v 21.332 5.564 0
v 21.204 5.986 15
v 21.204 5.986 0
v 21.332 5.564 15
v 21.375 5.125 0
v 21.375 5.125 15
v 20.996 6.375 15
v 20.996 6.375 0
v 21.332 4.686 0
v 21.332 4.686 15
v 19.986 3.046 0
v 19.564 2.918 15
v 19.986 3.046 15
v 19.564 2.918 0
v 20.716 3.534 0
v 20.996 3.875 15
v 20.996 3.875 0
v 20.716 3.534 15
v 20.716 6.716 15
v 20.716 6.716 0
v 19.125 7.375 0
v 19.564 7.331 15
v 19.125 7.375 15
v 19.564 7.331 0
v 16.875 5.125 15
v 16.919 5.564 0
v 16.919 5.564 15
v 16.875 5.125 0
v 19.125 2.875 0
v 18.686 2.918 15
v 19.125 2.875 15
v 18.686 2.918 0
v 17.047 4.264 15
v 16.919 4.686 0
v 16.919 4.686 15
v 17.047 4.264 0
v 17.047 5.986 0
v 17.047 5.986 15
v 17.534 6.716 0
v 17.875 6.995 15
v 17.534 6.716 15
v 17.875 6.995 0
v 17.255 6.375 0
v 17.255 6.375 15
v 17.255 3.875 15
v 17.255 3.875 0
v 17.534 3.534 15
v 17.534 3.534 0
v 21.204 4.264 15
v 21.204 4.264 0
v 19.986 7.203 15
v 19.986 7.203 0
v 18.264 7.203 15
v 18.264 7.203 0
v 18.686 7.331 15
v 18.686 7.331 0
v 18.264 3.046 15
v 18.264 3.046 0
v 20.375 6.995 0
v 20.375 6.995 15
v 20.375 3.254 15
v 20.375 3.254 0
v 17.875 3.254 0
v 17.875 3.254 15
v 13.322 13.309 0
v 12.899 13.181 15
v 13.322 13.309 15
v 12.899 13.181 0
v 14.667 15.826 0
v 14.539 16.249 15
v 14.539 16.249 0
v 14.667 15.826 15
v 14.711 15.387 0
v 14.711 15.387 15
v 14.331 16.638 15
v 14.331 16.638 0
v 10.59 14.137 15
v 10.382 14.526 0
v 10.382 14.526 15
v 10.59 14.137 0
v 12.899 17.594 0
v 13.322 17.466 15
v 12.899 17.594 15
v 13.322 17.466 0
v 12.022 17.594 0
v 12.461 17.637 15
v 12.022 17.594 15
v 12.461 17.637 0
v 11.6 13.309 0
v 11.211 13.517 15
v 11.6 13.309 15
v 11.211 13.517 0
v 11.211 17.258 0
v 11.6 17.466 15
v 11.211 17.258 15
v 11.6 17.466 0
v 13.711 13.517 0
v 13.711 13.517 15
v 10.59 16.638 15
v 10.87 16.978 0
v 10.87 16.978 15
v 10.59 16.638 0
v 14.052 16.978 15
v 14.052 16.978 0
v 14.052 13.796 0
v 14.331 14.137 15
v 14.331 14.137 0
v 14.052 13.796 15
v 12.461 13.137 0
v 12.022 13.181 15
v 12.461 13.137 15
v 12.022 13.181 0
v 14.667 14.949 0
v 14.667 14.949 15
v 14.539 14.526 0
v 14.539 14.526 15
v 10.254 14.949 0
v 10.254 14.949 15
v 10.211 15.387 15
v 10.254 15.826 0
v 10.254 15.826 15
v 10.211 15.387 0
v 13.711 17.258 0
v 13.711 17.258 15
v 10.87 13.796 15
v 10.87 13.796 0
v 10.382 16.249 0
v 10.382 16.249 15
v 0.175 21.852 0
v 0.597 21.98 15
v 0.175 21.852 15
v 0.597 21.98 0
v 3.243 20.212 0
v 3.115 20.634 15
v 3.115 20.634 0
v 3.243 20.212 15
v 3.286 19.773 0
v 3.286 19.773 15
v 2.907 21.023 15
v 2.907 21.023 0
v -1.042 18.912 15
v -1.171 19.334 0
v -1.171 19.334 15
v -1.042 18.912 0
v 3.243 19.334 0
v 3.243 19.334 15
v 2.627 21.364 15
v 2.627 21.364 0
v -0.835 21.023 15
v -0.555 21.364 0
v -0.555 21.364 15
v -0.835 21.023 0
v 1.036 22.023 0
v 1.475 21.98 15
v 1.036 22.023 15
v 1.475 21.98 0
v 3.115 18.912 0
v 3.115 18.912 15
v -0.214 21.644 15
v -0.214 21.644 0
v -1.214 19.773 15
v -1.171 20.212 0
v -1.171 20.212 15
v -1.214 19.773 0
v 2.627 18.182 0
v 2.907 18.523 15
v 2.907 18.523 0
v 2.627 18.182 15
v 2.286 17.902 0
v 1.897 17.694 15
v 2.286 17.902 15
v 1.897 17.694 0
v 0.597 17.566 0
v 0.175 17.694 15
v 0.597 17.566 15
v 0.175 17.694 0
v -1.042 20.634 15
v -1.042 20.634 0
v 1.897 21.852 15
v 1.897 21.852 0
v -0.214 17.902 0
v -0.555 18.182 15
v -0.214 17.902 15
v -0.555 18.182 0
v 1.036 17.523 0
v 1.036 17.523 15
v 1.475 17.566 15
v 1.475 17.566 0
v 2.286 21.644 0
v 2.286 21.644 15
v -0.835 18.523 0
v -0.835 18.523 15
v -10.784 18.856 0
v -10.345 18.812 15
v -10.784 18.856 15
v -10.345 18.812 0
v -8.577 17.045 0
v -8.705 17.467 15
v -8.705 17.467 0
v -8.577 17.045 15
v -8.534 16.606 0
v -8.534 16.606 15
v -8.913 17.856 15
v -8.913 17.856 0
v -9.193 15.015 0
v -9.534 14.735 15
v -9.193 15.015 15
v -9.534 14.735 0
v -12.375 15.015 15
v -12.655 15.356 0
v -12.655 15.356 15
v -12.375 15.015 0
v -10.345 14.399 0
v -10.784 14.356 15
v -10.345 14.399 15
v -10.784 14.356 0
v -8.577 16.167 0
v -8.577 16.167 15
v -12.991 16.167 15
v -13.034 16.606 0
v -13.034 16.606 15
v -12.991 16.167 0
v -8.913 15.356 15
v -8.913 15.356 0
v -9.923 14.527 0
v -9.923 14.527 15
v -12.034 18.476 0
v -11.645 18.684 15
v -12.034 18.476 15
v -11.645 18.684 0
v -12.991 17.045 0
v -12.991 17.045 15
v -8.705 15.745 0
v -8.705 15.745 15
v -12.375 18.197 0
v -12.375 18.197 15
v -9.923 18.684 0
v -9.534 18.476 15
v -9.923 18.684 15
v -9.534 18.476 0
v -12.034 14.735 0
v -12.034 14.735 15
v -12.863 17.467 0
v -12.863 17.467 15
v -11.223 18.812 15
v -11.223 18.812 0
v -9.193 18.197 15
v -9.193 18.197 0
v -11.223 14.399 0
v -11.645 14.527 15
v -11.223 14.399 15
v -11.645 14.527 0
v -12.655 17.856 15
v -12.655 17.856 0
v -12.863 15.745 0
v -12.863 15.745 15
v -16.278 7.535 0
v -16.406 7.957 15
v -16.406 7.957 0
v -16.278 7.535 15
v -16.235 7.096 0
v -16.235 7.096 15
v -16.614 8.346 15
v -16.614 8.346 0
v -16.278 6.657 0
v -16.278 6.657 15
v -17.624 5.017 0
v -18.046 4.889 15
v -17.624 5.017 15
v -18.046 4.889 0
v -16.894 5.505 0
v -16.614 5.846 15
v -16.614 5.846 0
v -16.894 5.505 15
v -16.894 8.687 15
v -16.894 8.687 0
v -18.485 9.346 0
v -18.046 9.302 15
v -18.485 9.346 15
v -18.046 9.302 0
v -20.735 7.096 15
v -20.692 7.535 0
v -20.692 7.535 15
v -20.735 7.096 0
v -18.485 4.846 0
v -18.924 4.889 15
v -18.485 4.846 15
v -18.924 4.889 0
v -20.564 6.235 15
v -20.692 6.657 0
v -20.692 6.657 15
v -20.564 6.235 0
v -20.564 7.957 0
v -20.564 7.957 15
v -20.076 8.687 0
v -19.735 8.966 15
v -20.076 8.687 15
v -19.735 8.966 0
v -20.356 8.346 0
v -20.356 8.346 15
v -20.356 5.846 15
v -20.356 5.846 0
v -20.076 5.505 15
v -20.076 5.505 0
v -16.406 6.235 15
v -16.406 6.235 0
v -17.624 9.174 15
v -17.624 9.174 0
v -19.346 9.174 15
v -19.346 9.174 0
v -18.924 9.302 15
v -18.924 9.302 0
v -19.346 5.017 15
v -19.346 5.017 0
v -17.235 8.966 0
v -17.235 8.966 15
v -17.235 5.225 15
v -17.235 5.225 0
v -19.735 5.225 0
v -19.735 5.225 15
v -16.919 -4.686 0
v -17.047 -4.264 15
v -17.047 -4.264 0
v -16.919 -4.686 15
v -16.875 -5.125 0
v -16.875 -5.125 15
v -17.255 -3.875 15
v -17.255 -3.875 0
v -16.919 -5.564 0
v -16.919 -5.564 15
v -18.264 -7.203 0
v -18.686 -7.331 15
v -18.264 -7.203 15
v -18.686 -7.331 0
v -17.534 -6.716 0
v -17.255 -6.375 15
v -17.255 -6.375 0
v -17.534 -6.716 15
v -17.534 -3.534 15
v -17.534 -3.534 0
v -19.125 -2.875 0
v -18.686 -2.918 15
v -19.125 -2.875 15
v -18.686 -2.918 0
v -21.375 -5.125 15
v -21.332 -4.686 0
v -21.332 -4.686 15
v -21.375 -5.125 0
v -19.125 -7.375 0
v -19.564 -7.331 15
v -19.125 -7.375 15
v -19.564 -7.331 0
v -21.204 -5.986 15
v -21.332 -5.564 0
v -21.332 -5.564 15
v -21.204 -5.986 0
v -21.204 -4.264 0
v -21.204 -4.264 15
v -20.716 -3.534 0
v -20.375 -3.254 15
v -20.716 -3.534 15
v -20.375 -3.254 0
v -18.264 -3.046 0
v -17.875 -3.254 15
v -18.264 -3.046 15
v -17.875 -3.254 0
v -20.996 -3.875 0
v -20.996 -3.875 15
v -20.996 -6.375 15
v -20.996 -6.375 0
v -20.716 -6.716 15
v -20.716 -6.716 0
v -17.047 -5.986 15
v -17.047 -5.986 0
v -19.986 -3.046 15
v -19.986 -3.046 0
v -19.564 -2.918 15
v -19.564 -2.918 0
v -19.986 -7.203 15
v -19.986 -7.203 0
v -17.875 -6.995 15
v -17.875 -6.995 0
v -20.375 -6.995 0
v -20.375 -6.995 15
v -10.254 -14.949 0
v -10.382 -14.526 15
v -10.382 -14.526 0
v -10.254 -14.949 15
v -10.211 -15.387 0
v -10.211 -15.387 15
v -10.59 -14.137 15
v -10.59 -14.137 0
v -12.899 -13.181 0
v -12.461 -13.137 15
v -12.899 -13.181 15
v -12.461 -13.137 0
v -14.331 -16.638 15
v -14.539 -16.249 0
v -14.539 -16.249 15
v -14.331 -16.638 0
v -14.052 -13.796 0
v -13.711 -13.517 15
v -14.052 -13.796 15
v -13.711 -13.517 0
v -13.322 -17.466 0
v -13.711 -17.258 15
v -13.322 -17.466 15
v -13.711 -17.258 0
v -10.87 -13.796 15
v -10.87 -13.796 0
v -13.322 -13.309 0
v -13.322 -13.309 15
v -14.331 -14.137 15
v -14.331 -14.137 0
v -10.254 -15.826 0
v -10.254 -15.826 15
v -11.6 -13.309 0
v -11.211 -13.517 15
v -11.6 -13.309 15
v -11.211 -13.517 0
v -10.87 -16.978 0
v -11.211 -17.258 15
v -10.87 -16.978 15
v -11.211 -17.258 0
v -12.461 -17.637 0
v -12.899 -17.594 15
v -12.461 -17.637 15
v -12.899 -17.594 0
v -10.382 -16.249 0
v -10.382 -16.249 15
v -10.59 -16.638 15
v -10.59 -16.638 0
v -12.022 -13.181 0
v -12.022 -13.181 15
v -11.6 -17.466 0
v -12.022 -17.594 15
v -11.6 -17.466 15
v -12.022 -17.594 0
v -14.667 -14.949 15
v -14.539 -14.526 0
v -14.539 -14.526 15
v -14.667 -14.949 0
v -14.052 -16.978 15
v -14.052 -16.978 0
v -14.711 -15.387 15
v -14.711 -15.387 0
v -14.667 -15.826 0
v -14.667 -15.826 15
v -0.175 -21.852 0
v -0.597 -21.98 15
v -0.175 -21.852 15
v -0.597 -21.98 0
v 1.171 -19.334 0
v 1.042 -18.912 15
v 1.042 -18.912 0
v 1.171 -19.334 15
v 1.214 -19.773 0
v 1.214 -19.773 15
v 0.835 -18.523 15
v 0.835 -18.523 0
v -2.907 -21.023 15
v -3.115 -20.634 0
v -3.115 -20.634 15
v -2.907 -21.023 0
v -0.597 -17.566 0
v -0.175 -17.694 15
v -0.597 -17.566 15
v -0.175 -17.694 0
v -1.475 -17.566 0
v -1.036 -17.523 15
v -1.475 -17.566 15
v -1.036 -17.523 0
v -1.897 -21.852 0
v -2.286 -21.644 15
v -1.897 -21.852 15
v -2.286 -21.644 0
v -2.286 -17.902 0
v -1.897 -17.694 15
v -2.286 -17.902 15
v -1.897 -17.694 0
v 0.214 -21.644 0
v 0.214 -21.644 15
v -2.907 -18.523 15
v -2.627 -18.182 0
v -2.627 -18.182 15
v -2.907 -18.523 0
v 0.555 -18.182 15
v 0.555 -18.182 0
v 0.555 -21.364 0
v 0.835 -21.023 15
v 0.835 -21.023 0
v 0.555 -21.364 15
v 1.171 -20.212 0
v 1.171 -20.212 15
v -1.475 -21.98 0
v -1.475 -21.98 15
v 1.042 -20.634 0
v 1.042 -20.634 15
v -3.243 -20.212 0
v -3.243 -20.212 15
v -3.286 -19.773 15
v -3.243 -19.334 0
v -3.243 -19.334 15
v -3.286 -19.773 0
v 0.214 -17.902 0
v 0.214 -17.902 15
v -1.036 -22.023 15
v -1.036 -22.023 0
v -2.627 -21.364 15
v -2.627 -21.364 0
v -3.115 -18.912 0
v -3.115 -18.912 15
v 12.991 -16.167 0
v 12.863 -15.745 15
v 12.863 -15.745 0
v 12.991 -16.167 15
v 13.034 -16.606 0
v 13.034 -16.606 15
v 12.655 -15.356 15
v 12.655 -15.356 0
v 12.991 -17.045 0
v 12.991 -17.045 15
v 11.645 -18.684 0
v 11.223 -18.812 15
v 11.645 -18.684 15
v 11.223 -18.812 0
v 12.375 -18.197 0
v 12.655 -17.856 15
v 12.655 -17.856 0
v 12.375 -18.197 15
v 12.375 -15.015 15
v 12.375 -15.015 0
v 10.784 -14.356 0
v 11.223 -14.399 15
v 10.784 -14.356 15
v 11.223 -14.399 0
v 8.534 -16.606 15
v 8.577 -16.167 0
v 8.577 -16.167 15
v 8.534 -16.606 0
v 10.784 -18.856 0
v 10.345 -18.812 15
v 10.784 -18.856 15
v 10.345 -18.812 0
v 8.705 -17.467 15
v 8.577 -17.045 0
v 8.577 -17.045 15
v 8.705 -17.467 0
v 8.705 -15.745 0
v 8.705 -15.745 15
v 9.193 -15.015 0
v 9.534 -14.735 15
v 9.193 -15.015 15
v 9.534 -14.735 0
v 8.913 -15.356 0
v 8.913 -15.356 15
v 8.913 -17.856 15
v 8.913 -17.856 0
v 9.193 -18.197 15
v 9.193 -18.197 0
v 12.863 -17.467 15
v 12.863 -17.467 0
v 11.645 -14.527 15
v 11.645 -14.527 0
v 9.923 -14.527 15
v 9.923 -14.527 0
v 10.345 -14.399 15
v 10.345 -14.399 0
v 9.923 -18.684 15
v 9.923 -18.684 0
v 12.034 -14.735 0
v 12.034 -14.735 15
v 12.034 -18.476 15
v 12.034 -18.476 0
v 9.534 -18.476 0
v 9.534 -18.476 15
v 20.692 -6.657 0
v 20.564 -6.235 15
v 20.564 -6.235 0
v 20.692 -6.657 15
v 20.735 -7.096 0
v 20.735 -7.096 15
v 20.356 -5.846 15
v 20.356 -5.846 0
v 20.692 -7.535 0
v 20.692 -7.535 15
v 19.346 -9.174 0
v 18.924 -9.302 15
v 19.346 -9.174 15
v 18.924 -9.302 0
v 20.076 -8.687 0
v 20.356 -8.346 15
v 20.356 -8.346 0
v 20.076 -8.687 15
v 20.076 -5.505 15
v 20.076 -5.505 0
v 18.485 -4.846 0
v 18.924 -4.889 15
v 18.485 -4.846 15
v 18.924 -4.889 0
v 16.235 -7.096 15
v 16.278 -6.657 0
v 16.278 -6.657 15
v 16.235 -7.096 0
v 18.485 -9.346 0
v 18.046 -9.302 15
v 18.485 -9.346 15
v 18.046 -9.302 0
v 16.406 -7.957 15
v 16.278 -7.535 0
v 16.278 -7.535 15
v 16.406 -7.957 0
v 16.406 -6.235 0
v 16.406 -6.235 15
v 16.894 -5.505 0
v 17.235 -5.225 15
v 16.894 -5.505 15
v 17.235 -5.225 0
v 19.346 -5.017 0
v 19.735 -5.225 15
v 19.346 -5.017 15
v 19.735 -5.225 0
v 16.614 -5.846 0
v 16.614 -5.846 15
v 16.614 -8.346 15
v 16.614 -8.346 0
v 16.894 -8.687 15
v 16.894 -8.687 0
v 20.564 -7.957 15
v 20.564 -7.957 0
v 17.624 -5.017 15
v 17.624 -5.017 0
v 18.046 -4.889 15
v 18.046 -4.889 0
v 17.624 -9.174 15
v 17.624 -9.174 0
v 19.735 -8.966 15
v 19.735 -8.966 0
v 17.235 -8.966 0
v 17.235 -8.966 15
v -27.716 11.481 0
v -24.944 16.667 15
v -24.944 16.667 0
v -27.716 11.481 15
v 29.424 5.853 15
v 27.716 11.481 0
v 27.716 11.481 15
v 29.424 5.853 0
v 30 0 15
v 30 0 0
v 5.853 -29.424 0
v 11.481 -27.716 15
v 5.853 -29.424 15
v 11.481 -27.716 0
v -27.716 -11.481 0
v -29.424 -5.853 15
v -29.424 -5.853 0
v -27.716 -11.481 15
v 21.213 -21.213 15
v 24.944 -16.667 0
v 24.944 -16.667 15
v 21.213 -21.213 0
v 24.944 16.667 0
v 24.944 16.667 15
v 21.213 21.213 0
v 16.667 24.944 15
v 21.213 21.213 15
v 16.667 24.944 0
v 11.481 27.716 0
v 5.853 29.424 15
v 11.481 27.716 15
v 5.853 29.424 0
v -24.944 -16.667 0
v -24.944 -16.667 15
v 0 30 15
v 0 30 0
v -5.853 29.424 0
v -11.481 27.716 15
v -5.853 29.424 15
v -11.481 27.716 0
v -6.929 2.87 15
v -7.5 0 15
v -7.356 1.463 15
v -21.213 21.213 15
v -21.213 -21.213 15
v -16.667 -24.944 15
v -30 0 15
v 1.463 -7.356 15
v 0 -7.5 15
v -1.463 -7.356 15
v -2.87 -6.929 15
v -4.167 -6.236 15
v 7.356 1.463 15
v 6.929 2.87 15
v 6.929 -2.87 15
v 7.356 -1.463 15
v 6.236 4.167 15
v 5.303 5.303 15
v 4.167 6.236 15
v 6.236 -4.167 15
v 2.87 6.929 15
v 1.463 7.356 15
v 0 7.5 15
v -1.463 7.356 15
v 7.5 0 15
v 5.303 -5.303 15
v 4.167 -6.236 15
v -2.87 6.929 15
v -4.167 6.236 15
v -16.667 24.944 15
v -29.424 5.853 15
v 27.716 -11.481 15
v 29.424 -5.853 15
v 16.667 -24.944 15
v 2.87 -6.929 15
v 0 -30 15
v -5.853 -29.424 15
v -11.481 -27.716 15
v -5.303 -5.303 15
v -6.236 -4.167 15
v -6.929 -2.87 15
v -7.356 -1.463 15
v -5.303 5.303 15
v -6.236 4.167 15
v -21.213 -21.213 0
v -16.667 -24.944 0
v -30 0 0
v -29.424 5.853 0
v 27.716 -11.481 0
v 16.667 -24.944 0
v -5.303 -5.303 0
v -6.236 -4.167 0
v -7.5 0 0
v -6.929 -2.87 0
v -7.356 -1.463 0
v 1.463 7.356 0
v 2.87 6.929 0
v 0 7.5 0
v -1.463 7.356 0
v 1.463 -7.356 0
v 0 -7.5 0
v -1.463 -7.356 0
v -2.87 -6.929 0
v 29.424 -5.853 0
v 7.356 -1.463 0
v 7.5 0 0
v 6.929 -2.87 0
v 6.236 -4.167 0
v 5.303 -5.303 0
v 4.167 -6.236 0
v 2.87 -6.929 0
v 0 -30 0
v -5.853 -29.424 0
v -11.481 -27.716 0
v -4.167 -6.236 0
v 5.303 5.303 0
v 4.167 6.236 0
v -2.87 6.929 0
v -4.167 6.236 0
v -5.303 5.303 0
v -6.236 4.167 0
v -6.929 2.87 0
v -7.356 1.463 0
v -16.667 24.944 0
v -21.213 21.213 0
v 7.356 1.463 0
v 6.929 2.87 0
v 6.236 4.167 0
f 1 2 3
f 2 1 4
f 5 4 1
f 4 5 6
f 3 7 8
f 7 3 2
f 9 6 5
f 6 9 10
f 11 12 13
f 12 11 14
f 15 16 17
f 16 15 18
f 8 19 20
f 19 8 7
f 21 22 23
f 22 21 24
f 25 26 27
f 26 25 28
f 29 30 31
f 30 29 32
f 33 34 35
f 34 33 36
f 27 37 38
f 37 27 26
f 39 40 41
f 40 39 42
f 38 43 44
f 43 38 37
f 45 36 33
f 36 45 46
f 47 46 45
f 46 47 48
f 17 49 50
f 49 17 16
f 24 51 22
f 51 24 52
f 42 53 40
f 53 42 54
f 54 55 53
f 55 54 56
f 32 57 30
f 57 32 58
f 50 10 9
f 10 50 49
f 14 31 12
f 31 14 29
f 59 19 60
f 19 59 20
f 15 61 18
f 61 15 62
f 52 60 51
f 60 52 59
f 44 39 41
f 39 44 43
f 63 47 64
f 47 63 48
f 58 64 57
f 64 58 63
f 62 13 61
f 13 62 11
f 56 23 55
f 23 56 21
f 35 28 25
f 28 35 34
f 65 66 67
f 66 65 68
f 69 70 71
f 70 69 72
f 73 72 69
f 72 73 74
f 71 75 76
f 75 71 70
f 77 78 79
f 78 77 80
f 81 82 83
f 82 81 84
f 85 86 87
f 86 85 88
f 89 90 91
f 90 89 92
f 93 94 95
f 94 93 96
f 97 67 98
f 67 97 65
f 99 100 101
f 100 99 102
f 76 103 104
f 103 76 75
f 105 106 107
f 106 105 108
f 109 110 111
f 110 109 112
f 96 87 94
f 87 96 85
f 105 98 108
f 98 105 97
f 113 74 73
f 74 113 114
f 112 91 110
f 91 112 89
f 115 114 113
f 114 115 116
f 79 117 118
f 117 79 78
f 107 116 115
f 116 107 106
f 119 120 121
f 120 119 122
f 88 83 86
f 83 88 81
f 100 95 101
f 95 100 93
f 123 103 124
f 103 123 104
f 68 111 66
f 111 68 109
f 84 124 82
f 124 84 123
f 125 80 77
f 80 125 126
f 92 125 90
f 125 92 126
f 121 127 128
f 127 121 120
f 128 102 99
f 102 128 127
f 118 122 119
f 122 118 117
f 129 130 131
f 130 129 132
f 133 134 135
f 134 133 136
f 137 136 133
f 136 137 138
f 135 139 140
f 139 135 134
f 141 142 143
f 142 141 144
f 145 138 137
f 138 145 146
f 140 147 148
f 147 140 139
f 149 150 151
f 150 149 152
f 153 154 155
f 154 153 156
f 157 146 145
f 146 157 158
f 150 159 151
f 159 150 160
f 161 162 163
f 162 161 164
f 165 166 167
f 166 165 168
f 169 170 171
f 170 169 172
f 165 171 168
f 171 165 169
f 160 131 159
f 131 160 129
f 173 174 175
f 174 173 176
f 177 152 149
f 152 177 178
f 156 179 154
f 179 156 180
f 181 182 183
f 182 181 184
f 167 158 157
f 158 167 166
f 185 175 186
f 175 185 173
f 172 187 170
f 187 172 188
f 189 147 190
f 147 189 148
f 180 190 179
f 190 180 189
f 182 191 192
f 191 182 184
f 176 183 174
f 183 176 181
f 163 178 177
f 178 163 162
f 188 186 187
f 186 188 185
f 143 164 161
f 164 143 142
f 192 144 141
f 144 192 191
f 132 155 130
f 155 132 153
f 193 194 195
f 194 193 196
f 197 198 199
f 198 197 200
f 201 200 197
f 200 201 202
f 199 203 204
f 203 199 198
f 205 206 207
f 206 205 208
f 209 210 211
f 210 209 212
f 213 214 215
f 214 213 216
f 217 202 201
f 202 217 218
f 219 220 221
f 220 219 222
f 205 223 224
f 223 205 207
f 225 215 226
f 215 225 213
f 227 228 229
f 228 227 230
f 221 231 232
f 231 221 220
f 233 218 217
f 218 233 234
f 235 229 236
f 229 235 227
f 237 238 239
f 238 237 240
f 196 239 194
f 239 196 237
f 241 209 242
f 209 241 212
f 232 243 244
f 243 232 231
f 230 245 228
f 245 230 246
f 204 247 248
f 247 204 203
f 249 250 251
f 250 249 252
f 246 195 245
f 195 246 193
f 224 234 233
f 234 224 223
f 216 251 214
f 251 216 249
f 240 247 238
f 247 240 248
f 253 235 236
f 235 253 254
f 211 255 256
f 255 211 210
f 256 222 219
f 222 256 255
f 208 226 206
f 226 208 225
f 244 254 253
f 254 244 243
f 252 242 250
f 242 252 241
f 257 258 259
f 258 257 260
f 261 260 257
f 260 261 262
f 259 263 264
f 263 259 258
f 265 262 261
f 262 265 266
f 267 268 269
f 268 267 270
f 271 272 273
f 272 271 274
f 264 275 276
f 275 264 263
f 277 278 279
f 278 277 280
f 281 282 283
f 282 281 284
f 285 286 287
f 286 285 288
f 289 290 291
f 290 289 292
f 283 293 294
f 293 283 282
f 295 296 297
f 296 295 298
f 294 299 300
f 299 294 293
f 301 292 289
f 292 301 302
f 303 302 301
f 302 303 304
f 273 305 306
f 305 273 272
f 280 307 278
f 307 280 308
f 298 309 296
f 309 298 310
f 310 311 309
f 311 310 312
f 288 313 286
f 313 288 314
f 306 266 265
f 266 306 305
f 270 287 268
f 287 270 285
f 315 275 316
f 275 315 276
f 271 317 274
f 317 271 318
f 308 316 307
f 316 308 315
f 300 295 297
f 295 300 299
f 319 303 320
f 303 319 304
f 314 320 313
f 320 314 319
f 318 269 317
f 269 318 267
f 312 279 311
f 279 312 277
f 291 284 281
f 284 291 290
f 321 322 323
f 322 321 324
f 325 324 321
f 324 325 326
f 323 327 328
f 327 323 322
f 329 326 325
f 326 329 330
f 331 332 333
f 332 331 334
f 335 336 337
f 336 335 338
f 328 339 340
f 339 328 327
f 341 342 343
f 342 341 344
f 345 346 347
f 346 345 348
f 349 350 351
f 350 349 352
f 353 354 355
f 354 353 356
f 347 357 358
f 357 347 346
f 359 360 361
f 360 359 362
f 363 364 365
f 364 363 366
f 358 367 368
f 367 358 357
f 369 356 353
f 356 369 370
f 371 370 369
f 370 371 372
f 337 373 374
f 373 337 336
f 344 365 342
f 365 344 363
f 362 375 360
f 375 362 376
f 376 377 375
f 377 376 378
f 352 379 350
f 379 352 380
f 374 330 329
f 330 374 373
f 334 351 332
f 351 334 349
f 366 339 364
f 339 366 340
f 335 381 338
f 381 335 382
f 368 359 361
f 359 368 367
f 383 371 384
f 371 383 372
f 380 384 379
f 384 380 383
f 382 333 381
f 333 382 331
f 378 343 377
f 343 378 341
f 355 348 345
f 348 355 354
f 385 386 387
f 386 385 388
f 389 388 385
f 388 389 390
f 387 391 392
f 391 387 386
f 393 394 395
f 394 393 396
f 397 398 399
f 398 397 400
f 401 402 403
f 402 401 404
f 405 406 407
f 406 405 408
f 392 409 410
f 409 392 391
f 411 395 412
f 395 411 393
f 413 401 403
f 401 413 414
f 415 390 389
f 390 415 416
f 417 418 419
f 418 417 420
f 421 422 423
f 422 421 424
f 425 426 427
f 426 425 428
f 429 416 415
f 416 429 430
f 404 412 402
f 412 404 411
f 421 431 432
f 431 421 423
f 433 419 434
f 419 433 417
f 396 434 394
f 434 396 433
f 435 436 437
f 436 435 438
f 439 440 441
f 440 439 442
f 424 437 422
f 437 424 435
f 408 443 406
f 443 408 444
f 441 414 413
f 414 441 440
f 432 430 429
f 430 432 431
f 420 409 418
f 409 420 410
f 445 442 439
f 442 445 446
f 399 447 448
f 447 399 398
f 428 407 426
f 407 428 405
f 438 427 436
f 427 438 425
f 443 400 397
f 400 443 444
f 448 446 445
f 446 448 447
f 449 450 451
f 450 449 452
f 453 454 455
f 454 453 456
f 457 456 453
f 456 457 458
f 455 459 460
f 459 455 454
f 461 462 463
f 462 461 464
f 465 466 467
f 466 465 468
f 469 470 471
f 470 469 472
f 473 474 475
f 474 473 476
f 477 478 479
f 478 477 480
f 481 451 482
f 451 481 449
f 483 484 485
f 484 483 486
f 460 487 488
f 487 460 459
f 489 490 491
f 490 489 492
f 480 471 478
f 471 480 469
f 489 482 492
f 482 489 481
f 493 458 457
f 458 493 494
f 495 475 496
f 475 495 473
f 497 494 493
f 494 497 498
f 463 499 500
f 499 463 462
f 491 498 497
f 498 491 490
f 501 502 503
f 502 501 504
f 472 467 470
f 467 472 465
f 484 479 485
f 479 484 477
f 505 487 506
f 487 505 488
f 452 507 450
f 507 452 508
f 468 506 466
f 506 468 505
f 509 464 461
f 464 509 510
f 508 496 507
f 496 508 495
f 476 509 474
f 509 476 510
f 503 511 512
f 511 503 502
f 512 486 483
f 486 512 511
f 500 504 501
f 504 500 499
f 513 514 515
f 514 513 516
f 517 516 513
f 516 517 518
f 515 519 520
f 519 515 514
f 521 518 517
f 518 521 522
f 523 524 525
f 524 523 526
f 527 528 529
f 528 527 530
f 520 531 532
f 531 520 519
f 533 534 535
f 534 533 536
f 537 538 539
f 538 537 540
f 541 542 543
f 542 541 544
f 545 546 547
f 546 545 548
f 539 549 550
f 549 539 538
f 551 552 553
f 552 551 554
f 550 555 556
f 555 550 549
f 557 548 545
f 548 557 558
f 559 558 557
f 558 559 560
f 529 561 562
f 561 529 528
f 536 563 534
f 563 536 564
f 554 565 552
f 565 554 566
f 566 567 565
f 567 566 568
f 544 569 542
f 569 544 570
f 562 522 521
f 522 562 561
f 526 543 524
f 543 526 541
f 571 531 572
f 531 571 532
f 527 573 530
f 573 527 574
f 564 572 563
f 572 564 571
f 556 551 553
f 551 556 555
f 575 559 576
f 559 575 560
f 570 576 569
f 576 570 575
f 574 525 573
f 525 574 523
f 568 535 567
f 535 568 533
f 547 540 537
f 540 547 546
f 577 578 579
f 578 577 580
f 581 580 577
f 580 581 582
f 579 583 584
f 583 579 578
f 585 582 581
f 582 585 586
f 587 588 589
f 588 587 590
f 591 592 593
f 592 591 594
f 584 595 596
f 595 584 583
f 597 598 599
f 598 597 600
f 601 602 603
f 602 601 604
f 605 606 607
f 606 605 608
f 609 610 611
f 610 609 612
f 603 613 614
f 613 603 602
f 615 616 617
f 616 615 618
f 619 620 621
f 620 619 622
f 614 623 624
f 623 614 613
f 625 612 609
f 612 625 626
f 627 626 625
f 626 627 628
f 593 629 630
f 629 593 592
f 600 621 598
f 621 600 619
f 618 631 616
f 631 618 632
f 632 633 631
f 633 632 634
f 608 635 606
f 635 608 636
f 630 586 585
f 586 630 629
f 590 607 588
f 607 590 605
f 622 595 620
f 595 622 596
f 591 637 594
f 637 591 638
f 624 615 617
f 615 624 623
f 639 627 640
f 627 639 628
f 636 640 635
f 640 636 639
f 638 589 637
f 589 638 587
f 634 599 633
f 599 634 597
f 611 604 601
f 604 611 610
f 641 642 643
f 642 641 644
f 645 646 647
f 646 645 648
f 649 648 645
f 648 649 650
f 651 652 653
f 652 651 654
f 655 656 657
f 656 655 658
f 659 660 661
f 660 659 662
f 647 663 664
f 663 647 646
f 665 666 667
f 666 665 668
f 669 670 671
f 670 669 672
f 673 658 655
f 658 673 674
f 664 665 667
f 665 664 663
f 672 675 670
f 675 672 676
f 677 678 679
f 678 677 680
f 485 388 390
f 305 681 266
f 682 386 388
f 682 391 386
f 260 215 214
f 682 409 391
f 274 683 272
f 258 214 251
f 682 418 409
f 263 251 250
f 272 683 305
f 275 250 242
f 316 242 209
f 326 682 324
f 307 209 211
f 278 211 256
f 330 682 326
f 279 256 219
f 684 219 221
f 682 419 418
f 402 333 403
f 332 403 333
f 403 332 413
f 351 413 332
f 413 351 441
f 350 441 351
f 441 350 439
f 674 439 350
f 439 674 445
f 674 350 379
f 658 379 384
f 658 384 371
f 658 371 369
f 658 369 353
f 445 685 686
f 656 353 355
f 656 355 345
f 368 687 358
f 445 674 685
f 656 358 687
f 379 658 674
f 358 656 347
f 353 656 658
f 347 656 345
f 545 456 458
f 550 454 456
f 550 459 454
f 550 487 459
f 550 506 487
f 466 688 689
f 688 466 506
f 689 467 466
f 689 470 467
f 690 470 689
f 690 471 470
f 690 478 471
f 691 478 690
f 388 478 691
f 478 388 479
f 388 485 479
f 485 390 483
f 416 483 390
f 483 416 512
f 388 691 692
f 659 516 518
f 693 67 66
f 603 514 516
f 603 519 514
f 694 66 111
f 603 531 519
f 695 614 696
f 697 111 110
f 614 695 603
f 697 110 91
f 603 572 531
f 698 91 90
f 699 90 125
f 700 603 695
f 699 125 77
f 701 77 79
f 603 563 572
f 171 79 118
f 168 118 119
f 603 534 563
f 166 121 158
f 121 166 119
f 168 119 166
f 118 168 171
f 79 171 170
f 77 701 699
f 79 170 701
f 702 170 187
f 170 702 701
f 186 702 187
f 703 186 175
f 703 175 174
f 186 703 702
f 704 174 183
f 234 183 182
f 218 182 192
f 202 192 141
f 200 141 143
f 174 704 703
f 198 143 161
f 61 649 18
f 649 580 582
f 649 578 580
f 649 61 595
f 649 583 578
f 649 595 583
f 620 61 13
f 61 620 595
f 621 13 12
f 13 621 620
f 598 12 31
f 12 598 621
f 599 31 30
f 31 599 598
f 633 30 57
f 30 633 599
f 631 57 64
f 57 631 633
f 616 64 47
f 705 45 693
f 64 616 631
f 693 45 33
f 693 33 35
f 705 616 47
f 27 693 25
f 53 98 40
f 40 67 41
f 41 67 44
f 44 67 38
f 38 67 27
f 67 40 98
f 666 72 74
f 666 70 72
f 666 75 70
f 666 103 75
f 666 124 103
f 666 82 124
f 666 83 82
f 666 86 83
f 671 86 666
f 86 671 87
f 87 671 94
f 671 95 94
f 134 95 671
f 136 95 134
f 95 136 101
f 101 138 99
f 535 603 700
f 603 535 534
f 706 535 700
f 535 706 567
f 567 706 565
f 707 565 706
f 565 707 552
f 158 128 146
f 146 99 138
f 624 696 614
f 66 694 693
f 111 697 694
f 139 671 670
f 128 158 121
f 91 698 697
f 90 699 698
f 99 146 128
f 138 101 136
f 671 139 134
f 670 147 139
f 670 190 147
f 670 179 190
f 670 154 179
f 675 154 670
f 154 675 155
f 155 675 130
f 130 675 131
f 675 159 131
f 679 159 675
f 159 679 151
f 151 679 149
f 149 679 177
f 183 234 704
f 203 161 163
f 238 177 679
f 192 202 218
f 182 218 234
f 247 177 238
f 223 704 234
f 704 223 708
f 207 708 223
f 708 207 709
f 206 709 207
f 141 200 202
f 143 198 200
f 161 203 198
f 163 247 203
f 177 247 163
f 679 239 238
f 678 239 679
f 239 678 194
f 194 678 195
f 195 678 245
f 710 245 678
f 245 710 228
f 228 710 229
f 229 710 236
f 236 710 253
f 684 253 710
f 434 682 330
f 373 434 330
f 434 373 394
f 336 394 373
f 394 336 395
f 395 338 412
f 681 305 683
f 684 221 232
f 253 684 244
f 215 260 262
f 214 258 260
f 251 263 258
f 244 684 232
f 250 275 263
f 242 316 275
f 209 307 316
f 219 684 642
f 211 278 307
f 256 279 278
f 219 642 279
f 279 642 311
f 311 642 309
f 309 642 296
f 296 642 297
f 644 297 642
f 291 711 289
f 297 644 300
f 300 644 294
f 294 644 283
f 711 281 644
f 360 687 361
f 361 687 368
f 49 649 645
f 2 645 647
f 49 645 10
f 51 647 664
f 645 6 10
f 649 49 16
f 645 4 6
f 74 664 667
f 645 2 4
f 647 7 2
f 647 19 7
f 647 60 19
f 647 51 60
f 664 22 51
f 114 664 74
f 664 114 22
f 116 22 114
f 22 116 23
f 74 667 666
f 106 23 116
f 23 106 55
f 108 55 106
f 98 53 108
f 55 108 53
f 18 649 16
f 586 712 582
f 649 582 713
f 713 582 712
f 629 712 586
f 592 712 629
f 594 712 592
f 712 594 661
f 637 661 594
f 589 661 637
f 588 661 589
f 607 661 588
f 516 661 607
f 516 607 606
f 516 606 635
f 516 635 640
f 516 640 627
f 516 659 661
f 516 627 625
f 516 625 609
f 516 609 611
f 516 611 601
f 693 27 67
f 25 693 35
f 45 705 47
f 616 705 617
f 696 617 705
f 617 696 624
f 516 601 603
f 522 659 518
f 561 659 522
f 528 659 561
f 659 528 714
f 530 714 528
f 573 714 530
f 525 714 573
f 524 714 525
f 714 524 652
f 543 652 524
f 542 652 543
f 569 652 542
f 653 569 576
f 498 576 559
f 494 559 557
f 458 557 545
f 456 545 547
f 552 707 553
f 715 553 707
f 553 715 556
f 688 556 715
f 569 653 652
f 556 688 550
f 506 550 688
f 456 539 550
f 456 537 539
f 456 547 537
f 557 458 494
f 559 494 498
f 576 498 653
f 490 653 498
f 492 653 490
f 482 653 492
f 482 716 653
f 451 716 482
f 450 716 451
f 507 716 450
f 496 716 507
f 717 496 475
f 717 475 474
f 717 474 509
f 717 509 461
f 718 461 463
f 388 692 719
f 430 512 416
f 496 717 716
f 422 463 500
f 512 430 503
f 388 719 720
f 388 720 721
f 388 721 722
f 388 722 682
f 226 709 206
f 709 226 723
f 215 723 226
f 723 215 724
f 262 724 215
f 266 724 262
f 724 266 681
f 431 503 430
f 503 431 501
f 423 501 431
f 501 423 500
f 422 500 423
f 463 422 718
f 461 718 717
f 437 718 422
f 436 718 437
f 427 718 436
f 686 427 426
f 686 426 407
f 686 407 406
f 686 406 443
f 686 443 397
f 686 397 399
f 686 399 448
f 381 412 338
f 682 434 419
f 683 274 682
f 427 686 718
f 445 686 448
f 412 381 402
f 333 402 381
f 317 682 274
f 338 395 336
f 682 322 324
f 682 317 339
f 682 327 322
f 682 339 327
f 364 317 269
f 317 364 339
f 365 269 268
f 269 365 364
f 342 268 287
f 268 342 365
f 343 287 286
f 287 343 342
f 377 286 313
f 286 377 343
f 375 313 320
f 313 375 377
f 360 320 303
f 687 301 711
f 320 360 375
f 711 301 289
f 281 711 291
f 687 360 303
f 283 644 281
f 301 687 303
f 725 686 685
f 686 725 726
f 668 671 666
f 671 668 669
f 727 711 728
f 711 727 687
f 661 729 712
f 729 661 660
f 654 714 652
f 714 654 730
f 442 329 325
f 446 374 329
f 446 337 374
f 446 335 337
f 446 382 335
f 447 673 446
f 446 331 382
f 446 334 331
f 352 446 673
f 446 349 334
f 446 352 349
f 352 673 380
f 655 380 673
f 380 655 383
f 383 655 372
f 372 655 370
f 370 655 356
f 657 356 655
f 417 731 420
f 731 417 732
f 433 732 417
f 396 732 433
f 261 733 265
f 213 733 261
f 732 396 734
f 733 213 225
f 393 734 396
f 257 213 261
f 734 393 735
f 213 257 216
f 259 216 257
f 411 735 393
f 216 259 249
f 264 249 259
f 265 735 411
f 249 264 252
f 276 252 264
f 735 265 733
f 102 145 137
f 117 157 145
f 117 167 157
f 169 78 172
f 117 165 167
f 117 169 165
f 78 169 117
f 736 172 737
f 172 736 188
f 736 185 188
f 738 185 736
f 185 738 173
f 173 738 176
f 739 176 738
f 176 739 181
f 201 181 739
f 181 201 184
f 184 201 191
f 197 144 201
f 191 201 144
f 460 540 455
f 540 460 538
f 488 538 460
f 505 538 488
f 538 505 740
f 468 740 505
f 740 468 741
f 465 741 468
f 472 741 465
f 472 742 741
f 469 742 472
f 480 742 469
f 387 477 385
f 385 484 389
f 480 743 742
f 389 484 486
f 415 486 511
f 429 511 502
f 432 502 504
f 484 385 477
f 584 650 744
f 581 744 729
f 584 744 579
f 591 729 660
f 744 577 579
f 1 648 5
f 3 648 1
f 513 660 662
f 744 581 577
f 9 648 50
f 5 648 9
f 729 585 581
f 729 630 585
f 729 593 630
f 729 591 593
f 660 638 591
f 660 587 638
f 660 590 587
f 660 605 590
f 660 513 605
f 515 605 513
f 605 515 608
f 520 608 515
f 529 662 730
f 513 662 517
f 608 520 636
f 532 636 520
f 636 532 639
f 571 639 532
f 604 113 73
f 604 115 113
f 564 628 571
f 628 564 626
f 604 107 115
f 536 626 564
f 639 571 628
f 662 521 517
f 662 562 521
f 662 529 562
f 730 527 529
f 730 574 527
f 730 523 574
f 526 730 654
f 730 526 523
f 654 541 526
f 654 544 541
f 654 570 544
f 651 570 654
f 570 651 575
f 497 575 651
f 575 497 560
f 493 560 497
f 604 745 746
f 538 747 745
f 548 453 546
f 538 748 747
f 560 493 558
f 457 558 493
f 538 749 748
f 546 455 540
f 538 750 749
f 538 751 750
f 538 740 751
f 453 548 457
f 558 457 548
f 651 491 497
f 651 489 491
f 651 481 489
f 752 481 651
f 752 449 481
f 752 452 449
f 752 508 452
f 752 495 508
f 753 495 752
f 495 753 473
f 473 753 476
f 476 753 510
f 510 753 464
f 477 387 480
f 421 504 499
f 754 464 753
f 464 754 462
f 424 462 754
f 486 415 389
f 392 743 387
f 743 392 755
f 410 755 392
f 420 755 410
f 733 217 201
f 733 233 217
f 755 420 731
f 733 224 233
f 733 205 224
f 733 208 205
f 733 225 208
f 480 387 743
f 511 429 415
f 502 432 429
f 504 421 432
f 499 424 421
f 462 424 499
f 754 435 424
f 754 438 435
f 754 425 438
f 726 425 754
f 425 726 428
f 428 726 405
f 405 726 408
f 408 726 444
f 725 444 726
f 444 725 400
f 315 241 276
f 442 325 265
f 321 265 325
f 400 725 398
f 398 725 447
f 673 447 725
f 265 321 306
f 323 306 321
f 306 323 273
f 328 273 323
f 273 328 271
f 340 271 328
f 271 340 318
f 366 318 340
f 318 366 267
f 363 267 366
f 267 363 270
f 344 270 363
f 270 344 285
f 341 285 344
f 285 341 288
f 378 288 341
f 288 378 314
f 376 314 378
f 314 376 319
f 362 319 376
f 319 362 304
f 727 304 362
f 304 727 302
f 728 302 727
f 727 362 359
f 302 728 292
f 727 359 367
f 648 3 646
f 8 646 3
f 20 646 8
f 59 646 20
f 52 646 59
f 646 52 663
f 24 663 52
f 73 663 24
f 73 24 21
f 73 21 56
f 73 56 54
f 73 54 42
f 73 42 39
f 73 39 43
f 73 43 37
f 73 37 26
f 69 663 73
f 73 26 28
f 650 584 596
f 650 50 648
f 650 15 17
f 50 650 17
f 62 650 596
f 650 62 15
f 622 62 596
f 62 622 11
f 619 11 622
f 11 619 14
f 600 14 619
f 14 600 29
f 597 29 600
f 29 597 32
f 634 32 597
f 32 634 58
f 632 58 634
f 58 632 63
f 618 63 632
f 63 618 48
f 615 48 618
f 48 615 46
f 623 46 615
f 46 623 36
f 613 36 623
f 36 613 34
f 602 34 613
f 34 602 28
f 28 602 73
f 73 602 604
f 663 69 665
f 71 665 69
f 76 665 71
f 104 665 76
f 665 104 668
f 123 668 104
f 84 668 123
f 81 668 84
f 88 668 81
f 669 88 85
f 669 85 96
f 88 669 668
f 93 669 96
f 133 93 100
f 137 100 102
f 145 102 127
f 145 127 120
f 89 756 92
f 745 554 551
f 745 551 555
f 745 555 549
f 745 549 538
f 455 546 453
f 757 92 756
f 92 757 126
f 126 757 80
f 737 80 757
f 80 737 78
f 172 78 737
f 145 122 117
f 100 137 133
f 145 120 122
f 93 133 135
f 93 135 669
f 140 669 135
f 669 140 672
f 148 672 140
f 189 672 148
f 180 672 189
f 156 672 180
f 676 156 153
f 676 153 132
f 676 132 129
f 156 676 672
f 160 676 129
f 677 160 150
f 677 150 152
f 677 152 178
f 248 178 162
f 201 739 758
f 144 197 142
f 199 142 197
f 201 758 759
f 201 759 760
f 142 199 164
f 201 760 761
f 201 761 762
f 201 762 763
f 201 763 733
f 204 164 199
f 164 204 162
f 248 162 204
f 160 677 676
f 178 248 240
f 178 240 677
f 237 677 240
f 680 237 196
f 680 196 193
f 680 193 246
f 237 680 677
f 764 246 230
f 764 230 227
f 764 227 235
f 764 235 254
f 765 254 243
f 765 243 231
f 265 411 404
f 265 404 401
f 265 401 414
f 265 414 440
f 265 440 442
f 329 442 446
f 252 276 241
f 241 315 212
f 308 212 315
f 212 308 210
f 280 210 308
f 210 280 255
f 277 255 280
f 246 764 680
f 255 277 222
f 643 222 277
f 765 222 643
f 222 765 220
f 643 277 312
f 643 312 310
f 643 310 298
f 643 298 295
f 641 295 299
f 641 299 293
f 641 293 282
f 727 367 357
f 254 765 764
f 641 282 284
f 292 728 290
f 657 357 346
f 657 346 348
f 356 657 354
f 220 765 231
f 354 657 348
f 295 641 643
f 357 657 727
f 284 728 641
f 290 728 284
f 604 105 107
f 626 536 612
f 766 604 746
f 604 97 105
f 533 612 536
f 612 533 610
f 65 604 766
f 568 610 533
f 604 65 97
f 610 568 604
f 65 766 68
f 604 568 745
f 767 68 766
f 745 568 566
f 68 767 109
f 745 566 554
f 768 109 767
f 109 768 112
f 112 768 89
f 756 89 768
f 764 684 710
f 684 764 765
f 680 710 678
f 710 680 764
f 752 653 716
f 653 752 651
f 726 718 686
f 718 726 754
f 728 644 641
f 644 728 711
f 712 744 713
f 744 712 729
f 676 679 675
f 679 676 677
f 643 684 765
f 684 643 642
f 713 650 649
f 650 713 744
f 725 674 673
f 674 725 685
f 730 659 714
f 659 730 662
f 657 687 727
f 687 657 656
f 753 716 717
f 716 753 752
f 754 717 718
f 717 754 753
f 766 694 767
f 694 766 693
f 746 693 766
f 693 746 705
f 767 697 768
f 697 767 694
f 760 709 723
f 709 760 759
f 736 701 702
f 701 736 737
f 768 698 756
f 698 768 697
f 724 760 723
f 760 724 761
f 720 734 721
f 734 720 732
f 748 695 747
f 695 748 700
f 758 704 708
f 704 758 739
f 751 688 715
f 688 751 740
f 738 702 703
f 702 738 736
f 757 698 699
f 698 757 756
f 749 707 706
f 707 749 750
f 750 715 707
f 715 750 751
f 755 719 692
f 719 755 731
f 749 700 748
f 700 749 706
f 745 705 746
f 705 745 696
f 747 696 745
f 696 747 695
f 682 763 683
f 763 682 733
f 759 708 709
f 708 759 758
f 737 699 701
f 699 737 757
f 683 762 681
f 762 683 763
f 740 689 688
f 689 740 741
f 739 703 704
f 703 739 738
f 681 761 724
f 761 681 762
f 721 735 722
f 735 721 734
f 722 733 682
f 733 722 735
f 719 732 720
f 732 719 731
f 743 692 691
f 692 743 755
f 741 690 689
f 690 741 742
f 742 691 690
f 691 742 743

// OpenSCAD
$fn = 32;

// ----------------------------------------------------------------------
// Flange Ø60 x 15
// 10 holes on a Ø39.6 bolt circle, bolted joints
// ----------------------------------------------------------------------

// --- parameters (mm) ---
flange_d = 60;   // outside diameter of the flange
thickness = 15;  // flange thickness
holes = 10;      // number of bolt holes
pcd = 39.6;      // bolt circle diameter
start_deg = 15;  // angle of the first hole, from +X
hole_d = 4.5;    // bolt hole diameter
bore_d = 15;     // central through bore
hub_d = 27;      // hub outside diameter
hub_h = 0;       // hub height above the flange face (0 = no hub)

// --- derived feature positions (mm) ---
height = thickness + hub_h;  // = 15   overall height of the part
pcd_r = pcd / 2;             // = 19.8   bolt circle radius
hole_step = 360 / holes;     // = 36   angular pitch
feature_centers = [
  [pcd_r * cos(start_deg + 0 * hole_step), pcd_r * sin(start_deg + 0 * hole_step)],
  [pcd_r * cos(start_deg + 1 * hole_step), pcd_r * sin(start_deg + 1 * hole_step)],
  [pcd_r * cos(start_deg + 2 * hole_step), pcd_r * sin(start_deg + 2 * hole_step)],
  [pcd_r * cos(start_deg + 3 * hole_step), pcd_r * sin(start_deg + 3 * hole_step)],
  [pcd_r * cos(start_deg + 4 * hole_step), pcd_r * sin(start_deg + 4 * hole_step)],
  [pcd_r * cos(start_deg + 5 * hole_step), pcd_r * sin(start_deg + 5 * hole_step)],
  [pcd_r * cos(start_deg + 6 * hole_step), pcd_r * sin(start_deg + 6 * hole_step)],
  [pcd_r * cos(start_deg + 7 * hole_step), pcd_r * sin(start_deg + 7 * hole_step)],
  [pcd_r * cos(start_deg + 8 * hole_step), pcd_r * sin(start_deg + 8 * hole_step)],
  [pcd_r * cos(start_deg + 9 * hole_step), pcd_r * sin(start_deg + 9 * hole_step)]
];   // bolt hole centres on the pitch circle

// flange disc, every hole and the bore cut straight through
difference() {
  union() {
    cylinder(d = flange_d, h = thickness);
  }
  translate([0, 0, -1]) cylinder(d = bore_d, h = height + 2);  // bore, through
  for (centre = feature_centers)
    translate([centre[0], centre[1], -1]) cylinder(d = hole_d, h = thickness + 2);
}
